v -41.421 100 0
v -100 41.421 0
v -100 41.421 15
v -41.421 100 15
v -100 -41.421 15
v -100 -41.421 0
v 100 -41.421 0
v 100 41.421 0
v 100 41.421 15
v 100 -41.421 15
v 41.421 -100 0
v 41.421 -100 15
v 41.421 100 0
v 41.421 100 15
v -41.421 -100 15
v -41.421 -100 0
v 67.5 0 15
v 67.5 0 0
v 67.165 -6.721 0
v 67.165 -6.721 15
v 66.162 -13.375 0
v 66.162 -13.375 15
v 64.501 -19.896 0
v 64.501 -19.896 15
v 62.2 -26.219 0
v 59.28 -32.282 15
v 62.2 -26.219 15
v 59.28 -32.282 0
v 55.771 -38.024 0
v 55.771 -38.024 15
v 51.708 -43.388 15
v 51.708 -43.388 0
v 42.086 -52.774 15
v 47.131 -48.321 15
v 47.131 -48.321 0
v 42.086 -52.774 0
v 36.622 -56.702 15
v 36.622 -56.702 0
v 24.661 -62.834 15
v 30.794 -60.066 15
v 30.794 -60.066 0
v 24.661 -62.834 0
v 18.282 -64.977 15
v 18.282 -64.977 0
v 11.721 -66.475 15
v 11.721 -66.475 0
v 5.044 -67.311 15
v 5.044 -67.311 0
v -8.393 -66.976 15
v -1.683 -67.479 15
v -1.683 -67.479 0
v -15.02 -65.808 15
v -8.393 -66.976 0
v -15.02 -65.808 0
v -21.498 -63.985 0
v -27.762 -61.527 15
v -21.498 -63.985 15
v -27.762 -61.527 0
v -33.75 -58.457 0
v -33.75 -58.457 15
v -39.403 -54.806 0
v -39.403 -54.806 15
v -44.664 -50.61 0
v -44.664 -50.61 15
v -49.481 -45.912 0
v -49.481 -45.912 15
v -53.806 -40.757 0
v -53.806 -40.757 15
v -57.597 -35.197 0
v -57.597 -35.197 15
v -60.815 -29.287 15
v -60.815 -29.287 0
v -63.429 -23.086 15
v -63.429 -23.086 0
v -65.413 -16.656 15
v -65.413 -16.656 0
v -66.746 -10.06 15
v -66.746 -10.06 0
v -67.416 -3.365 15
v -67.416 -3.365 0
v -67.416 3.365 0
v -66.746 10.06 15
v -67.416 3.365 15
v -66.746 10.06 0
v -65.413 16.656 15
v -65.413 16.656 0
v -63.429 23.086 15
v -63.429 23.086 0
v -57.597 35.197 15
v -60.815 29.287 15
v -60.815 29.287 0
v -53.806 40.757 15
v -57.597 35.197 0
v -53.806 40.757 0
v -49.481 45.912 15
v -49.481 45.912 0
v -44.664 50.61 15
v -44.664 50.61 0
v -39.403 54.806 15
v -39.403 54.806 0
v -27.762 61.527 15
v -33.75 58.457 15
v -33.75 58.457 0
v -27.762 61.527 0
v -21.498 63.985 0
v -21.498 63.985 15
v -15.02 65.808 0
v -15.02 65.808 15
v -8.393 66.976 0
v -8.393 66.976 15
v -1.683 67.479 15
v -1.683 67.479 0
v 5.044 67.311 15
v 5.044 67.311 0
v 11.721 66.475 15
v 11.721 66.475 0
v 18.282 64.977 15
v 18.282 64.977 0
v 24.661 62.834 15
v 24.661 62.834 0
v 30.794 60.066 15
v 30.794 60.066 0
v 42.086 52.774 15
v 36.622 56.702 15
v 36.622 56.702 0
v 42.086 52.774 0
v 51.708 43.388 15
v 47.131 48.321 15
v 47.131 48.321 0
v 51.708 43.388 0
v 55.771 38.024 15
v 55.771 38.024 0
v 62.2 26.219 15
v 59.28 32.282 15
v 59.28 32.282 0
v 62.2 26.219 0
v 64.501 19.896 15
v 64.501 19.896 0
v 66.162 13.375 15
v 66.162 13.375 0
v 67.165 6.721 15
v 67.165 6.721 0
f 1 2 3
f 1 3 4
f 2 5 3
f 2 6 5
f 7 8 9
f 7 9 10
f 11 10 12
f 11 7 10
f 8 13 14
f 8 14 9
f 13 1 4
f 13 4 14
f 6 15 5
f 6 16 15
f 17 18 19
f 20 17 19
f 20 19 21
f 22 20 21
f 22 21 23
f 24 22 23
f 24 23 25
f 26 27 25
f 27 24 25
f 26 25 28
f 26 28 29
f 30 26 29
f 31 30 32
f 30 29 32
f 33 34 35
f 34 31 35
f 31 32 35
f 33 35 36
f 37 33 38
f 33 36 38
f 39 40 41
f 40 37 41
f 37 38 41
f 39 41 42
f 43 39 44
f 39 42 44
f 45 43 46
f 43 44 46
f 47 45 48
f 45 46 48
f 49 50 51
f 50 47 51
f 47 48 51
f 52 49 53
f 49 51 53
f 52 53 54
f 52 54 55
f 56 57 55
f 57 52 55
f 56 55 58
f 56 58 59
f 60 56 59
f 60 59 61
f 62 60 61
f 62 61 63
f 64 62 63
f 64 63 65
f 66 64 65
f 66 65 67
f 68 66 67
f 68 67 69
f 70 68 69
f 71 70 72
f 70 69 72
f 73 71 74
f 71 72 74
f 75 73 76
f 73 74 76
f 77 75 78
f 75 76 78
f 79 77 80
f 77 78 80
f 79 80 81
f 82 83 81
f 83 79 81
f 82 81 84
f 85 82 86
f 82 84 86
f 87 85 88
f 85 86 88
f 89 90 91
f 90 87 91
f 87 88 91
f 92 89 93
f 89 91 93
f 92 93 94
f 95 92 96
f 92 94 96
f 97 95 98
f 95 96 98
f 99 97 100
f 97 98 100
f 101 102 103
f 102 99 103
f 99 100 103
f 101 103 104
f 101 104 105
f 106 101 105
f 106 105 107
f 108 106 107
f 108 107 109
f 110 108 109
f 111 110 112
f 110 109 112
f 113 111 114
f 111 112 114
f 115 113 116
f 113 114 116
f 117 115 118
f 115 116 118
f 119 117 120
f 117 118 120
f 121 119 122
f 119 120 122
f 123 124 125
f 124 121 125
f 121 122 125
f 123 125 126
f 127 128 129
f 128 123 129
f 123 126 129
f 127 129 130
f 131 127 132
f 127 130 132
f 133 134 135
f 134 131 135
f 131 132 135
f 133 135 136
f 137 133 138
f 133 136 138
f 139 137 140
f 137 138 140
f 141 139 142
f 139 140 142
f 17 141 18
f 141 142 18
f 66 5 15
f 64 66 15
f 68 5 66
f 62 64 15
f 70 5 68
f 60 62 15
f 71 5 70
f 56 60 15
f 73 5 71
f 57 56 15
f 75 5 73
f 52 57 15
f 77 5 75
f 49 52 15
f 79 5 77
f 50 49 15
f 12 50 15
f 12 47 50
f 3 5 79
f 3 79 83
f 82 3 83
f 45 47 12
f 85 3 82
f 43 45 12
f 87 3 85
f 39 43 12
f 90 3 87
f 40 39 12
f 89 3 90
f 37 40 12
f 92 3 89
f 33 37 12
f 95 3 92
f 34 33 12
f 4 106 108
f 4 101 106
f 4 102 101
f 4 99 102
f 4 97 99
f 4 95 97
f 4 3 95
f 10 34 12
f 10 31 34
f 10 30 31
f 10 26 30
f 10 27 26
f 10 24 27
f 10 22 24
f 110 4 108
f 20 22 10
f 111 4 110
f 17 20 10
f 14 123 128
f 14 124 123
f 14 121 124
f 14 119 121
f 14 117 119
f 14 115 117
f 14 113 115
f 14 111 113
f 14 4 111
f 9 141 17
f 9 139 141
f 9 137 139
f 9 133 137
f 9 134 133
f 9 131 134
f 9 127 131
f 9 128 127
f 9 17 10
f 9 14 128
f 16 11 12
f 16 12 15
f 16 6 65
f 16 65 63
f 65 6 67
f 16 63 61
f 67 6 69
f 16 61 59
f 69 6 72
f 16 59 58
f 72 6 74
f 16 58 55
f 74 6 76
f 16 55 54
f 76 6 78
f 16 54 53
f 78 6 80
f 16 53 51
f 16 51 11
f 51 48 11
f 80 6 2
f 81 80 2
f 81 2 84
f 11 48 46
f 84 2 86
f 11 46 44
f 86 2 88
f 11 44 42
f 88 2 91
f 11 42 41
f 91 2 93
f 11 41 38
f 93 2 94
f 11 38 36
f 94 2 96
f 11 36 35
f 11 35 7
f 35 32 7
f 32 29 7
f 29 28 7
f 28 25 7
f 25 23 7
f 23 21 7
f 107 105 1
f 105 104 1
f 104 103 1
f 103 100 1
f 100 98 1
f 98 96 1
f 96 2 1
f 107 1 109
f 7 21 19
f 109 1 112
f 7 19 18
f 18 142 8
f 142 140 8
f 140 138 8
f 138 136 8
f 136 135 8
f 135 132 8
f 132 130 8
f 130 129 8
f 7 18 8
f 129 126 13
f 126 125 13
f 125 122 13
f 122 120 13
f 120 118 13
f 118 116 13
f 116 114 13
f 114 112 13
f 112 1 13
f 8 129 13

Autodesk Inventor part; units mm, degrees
ref_plane "YZ Plane" through (0, 0, 0) normal (1, 0, 0) x (0, 1, 0)
ref_plane "XZ Plane" through (0, 0, 0) normal (0, 1, 0) x (-1, 0, 0)
ref_plane "XY Plane" through (0, 0, 0) normal (0, 0, 1) x (1, 0, 0)
sketch "Skizze2" plane through (0, 0, 0) normal (0, 0, 1) x (1, 0, 0)
  circle A0 centre (0, 0) radius 67.5
  line L0 (-41.4214, 100) -> (41.4214, 100)
  line L1 (41.4214, 100) -> (100, 41.4214)
  line L2 (100, 41.4214) -> (100, -41.4214)
  line L3 (100, -41.4214) -> (41.4214, -100)
  line L4 (41.4214, -100) -> (-41.4214, -100)
  line L5 (-41.4214, -100) -> (-100, -41.4214)
  line L6 (-100, -41.4214) -> (-100, 41.4214)
  line L7 (-100, 41.4214) -> (-41.4214, 100)
  dimension "d6" = 135
  dimension "d10" = 200
extrude "Extrusion2" add sketch "Skizze2" along normal blind 15
equation "\"kg_thickness\" = 4.9"
equation "\"ht_thickness\" = 1.9"
equation "\"case_thickness\" = 18"
equation "\"inner_thickness\" = 15"
equation "\"gap_fit\" = 0.1"
equation "\"gap_slide\" = 0.2"
equation "\"gap_air\" = 1"
equation "\"bore_diameter\" = 73"
equation "\"mdf_thickness\" = 6"
equation "\"tape_width\" = 15"
equation "\"tape_thickness\" = 3"
equation "\"inner_depth\" = 255"
properties part number "Korpus_Motor_15mm"
